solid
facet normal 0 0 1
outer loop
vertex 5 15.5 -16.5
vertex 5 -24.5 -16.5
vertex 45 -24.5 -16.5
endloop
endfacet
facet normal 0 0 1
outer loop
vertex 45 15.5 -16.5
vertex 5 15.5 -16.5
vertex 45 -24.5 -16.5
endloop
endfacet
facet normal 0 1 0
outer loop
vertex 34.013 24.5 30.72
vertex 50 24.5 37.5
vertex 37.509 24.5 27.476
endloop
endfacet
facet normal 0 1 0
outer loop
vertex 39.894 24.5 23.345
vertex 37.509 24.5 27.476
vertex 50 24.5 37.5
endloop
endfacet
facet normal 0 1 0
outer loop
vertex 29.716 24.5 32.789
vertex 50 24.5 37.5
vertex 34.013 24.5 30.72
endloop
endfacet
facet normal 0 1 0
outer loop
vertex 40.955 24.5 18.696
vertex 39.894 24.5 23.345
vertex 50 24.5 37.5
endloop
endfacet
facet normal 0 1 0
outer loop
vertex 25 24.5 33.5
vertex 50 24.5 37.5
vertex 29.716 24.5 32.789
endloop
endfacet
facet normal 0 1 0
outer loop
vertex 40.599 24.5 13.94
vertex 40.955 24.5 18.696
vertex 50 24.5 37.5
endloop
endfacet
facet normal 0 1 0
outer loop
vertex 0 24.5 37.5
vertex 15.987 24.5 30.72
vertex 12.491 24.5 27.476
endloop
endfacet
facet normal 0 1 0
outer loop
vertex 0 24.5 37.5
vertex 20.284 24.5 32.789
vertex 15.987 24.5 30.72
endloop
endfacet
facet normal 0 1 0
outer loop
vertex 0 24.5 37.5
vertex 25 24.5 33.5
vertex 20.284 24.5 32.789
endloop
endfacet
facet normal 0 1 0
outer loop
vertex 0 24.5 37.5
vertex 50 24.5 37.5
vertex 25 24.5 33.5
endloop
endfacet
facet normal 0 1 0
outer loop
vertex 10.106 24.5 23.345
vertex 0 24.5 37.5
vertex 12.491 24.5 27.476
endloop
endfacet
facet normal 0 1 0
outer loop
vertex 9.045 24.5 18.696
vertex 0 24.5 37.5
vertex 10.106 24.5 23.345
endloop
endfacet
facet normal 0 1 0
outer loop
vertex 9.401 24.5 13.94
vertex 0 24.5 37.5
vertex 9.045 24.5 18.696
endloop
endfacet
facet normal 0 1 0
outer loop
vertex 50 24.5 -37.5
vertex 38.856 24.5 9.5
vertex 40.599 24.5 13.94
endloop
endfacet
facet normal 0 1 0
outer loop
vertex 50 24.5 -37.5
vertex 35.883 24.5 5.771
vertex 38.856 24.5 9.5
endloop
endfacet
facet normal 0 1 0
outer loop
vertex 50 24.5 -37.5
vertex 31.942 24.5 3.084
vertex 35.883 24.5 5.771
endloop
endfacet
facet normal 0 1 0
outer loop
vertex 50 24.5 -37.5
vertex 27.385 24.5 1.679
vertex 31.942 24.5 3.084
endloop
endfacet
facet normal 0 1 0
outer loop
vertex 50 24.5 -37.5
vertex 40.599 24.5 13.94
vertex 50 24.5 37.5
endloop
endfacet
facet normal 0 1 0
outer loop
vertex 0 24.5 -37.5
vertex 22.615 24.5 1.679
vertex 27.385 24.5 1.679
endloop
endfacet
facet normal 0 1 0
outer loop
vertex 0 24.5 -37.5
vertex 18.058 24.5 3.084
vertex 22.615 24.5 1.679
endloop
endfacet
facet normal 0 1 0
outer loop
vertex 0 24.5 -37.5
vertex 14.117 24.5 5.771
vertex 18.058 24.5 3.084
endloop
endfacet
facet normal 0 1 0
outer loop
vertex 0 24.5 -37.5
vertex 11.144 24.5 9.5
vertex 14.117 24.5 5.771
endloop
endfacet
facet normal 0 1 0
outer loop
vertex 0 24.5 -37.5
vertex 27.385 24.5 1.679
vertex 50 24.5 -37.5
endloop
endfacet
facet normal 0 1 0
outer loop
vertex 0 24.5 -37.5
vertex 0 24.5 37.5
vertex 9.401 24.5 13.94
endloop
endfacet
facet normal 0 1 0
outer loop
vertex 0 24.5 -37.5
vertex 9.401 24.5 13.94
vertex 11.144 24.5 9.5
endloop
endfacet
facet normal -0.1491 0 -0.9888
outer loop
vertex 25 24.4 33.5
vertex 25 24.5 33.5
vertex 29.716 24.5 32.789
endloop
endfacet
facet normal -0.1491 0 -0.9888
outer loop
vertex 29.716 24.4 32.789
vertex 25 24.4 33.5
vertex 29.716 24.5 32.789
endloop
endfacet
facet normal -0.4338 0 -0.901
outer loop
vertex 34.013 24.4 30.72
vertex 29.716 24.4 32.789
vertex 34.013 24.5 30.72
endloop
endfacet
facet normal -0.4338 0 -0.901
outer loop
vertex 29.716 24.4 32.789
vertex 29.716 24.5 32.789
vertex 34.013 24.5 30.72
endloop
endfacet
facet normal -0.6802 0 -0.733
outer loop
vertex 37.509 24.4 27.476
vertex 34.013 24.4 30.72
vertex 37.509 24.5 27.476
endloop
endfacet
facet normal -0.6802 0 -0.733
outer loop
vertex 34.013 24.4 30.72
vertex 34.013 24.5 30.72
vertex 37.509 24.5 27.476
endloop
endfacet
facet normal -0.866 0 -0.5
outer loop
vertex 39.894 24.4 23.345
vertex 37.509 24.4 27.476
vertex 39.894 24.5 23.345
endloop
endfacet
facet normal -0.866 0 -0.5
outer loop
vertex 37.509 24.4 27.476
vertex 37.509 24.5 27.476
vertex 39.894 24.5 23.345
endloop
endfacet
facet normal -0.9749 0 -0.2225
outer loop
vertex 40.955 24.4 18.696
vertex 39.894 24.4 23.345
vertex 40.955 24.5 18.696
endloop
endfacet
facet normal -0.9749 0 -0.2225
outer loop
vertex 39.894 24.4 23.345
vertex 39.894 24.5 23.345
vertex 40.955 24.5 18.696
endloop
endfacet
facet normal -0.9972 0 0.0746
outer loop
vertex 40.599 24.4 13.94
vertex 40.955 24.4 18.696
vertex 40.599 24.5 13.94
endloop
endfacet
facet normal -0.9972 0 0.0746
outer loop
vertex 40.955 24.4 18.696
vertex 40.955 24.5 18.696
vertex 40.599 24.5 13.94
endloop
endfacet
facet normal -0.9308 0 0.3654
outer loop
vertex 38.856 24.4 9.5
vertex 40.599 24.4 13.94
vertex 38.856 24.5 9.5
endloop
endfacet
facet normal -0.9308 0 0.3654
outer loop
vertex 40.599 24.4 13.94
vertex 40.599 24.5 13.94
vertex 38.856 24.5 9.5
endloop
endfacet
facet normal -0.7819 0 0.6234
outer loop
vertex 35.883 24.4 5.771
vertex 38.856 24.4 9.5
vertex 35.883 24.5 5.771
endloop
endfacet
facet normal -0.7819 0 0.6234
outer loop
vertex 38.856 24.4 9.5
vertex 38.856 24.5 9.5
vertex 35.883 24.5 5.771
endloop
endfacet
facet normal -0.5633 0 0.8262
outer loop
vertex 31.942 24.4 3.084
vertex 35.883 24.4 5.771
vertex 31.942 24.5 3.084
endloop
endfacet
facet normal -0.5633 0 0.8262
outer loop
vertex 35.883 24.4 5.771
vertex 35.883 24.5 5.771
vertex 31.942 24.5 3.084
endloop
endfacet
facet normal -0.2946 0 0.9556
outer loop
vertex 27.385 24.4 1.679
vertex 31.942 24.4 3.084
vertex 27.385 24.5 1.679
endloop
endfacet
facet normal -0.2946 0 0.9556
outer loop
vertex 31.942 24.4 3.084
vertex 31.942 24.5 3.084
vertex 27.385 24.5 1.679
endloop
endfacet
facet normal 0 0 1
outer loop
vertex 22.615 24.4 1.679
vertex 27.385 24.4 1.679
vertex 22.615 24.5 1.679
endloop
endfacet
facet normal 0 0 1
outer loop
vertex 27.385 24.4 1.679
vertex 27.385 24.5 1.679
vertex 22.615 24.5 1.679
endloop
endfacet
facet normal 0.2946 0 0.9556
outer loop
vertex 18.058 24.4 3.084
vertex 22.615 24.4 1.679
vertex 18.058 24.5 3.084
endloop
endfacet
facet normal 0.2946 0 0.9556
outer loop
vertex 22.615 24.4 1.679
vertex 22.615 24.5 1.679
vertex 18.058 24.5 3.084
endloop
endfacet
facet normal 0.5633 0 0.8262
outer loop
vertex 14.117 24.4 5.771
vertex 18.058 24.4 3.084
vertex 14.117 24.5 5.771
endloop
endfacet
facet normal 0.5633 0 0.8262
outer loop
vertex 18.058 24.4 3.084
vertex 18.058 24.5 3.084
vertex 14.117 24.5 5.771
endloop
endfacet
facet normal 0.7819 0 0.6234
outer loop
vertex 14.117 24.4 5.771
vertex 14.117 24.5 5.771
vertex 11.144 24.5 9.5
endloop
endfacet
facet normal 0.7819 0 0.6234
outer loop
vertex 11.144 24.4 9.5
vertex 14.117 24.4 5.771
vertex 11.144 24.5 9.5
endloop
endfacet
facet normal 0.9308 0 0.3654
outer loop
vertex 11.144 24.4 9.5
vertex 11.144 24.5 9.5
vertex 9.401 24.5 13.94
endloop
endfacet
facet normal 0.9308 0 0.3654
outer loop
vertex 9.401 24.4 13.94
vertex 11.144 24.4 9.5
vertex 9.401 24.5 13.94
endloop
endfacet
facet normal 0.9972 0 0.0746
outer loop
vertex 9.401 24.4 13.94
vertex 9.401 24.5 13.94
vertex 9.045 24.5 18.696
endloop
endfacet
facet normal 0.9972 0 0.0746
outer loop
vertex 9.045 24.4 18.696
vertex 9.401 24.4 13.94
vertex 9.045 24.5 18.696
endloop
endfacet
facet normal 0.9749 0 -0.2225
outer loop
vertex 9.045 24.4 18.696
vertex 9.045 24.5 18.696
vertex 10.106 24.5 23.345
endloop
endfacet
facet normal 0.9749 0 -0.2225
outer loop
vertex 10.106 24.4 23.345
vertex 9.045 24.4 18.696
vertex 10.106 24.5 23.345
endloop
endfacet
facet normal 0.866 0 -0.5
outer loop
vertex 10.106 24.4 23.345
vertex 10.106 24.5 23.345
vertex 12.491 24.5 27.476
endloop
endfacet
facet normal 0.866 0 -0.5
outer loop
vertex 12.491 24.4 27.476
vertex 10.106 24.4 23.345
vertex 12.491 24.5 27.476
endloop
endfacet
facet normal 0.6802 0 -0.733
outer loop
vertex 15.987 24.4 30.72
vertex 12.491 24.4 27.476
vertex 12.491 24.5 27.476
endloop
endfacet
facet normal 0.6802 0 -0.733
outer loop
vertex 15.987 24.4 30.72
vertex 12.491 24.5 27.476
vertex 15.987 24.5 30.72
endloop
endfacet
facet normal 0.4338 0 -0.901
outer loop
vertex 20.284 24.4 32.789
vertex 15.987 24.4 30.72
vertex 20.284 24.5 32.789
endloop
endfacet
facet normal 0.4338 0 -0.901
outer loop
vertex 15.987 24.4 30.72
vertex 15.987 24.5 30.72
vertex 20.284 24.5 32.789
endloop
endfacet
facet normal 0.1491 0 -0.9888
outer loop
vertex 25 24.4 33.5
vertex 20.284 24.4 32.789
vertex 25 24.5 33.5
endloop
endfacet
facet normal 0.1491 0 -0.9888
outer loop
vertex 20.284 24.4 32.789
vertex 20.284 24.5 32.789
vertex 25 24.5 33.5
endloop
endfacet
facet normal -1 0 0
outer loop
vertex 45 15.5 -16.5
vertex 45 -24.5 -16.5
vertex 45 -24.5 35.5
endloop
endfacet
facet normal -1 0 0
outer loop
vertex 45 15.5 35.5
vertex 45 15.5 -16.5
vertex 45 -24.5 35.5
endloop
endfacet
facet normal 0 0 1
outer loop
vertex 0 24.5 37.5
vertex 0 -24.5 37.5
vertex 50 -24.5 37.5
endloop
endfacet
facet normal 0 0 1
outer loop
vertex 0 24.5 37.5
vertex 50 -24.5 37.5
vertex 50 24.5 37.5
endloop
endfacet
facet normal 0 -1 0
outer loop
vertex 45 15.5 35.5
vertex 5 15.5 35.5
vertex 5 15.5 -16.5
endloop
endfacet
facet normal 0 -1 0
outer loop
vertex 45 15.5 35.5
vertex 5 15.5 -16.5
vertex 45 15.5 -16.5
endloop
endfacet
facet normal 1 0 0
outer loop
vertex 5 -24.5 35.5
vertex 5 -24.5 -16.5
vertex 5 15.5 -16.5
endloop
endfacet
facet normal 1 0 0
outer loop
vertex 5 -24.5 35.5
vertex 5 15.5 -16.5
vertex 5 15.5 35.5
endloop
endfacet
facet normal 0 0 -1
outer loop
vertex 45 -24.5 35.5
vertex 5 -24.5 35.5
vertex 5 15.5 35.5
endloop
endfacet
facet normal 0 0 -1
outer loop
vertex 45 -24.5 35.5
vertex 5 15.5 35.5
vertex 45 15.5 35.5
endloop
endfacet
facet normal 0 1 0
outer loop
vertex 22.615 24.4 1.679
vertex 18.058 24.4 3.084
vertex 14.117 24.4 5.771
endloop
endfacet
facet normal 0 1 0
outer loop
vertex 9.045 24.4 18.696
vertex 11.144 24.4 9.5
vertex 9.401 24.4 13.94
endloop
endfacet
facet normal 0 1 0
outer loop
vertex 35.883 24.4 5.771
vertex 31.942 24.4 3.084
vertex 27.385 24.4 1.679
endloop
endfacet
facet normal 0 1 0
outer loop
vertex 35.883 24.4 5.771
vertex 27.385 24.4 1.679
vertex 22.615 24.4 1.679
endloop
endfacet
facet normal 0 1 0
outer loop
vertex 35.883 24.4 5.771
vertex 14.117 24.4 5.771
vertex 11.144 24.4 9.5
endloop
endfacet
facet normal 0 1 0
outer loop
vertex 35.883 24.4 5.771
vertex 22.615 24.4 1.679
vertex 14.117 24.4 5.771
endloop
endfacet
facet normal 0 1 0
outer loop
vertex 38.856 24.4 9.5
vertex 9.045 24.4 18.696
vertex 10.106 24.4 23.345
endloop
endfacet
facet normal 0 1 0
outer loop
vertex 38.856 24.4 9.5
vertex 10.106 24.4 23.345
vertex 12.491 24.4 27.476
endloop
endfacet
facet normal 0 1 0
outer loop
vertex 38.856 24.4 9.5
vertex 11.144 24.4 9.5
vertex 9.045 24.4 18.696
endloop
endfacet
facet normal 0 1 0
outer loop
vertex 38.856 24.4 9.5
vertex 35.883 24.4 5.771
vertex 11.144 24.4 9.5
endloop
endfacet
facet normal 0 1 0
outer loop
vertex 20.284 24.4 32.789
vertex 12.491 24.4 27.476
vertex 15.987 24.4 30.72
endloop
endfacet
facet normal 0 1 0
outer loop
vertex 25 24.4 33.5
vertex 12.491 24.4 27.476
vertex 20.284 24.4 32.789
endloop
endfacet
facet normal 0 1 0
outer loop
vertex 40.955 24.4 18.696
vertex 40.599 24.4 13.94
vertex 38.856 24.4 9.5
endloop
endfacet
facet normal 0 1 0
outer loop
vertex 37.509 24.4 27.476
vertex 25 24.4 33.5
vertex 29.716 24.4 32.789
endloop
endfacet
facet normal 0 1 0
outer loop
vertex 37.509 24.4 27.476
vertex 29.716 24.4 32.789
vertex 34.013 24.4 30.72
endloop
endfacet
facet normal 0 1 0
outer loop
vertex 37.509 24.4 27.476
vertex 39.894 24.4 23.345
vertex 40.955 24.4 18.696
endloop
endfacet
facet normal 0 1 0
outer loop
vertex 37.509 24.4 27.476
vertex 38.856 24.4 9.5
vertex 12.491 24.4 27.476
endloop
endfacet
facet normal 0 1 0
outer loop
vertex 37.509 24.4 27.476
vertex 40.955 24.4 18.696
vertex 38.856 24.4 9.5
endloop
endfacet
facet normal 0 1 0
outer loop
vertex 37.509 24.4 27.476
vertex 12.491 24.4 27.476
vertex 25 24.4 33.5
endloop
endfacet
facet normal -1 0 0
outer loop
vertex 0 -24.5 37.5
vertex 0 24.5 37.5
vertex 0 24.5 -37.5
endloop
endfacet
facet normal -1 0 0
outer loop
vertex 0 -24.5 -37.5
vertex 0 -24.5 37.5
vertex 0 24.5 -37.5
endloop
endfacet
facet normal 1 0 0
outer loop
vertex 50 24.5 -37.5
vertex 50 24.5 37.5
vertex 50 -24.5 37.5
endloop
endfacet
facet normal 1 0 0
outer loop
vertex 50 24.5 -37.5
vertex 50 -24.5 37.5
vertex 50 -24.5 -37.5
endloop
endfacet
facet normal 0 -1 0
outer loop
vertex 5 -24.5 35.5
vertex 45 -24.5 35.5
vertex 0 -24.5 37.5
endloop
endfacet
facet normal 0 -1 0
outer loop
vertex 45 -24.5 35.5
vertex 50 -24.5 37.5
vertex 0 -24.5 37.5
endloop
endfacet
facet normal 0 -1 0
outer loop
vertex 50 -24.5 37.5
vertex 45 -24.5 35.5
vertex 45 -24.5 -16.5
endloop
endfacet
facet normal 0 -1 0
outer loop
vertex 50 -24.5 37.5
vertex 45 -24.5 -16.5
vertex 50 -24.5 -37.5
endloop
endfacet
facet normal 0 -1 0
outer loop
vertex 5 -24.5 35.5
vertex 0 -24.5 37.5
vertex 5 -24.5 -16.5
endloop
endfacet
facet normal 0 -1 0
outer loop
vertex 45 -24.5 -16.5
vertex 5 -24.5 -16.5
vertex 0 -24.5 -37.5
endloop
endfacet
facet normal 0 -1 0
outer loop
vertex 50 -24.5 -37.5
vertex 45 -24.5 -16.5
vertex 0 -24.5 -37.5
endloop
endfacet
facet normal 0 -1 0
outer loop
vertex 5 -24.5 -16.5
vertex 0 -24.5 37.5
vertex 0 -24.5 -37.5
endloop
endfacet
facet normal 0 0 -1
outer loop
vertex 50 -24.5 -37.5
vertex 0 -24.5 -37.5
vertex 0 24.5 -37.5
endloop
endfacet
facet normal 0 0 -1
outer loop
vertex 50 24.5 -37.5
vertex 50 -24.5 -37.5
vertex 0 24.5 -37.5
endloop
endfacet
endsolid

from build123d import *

# Parameters (mm, degrees)
SKETCH1_W           = 75
SKETCH1_H           = 49
BOSS_EXTRUDE1_DEPTH = 50
SKETCH2_W           = 40
SKETCH2_H           = 52
CUT_EXTRUDE1_DEPTH  = 40
SKETCH3_R           = 16
CUT_EXTRUDE3_DEPTH  = 0.1


with BuildPart() as part:
    # Sketch1 → Boss-Extrude1 (new body)
    with BuildSketch(Plane(origin=(0, 0, 0), x_dir=(0, 0, -1), z_dir=(1, 0, 0))):
        Rectangle(SKETCH1_W, SKETCH1_H)
    extrude(amount=BOSS_EXTRUDE1_DEPTH)

    # Sketch2 → Cut-Extrude1 (cut)
    with BuildSketch(Plane.XZ.offset(24.5)):
        with Locations((25, 9.5)):
            Rectangle(SKETCH2_W, SKETCH2_H)
    extrude(amount=-CUT_EXTRUDE1_DEPTH, mode=Mode.SUBTRACT)

    # Sketch3 → Cut-Extrude3 (cut)
    with BuildSketch(Plane(origin=(0, 24.5, 0), x_dir=(1, 0, 0), z_dir=(0, 1, 0))):
        with Locations(Location((25, -17.5, 0), (0, 0, 270))):
            Circle(SKETCH3_R)
    extrude(amount=-CUT_EXTRUDE3_DEPTH, mode=Mode.SUBTRACT)


solid = part.part
